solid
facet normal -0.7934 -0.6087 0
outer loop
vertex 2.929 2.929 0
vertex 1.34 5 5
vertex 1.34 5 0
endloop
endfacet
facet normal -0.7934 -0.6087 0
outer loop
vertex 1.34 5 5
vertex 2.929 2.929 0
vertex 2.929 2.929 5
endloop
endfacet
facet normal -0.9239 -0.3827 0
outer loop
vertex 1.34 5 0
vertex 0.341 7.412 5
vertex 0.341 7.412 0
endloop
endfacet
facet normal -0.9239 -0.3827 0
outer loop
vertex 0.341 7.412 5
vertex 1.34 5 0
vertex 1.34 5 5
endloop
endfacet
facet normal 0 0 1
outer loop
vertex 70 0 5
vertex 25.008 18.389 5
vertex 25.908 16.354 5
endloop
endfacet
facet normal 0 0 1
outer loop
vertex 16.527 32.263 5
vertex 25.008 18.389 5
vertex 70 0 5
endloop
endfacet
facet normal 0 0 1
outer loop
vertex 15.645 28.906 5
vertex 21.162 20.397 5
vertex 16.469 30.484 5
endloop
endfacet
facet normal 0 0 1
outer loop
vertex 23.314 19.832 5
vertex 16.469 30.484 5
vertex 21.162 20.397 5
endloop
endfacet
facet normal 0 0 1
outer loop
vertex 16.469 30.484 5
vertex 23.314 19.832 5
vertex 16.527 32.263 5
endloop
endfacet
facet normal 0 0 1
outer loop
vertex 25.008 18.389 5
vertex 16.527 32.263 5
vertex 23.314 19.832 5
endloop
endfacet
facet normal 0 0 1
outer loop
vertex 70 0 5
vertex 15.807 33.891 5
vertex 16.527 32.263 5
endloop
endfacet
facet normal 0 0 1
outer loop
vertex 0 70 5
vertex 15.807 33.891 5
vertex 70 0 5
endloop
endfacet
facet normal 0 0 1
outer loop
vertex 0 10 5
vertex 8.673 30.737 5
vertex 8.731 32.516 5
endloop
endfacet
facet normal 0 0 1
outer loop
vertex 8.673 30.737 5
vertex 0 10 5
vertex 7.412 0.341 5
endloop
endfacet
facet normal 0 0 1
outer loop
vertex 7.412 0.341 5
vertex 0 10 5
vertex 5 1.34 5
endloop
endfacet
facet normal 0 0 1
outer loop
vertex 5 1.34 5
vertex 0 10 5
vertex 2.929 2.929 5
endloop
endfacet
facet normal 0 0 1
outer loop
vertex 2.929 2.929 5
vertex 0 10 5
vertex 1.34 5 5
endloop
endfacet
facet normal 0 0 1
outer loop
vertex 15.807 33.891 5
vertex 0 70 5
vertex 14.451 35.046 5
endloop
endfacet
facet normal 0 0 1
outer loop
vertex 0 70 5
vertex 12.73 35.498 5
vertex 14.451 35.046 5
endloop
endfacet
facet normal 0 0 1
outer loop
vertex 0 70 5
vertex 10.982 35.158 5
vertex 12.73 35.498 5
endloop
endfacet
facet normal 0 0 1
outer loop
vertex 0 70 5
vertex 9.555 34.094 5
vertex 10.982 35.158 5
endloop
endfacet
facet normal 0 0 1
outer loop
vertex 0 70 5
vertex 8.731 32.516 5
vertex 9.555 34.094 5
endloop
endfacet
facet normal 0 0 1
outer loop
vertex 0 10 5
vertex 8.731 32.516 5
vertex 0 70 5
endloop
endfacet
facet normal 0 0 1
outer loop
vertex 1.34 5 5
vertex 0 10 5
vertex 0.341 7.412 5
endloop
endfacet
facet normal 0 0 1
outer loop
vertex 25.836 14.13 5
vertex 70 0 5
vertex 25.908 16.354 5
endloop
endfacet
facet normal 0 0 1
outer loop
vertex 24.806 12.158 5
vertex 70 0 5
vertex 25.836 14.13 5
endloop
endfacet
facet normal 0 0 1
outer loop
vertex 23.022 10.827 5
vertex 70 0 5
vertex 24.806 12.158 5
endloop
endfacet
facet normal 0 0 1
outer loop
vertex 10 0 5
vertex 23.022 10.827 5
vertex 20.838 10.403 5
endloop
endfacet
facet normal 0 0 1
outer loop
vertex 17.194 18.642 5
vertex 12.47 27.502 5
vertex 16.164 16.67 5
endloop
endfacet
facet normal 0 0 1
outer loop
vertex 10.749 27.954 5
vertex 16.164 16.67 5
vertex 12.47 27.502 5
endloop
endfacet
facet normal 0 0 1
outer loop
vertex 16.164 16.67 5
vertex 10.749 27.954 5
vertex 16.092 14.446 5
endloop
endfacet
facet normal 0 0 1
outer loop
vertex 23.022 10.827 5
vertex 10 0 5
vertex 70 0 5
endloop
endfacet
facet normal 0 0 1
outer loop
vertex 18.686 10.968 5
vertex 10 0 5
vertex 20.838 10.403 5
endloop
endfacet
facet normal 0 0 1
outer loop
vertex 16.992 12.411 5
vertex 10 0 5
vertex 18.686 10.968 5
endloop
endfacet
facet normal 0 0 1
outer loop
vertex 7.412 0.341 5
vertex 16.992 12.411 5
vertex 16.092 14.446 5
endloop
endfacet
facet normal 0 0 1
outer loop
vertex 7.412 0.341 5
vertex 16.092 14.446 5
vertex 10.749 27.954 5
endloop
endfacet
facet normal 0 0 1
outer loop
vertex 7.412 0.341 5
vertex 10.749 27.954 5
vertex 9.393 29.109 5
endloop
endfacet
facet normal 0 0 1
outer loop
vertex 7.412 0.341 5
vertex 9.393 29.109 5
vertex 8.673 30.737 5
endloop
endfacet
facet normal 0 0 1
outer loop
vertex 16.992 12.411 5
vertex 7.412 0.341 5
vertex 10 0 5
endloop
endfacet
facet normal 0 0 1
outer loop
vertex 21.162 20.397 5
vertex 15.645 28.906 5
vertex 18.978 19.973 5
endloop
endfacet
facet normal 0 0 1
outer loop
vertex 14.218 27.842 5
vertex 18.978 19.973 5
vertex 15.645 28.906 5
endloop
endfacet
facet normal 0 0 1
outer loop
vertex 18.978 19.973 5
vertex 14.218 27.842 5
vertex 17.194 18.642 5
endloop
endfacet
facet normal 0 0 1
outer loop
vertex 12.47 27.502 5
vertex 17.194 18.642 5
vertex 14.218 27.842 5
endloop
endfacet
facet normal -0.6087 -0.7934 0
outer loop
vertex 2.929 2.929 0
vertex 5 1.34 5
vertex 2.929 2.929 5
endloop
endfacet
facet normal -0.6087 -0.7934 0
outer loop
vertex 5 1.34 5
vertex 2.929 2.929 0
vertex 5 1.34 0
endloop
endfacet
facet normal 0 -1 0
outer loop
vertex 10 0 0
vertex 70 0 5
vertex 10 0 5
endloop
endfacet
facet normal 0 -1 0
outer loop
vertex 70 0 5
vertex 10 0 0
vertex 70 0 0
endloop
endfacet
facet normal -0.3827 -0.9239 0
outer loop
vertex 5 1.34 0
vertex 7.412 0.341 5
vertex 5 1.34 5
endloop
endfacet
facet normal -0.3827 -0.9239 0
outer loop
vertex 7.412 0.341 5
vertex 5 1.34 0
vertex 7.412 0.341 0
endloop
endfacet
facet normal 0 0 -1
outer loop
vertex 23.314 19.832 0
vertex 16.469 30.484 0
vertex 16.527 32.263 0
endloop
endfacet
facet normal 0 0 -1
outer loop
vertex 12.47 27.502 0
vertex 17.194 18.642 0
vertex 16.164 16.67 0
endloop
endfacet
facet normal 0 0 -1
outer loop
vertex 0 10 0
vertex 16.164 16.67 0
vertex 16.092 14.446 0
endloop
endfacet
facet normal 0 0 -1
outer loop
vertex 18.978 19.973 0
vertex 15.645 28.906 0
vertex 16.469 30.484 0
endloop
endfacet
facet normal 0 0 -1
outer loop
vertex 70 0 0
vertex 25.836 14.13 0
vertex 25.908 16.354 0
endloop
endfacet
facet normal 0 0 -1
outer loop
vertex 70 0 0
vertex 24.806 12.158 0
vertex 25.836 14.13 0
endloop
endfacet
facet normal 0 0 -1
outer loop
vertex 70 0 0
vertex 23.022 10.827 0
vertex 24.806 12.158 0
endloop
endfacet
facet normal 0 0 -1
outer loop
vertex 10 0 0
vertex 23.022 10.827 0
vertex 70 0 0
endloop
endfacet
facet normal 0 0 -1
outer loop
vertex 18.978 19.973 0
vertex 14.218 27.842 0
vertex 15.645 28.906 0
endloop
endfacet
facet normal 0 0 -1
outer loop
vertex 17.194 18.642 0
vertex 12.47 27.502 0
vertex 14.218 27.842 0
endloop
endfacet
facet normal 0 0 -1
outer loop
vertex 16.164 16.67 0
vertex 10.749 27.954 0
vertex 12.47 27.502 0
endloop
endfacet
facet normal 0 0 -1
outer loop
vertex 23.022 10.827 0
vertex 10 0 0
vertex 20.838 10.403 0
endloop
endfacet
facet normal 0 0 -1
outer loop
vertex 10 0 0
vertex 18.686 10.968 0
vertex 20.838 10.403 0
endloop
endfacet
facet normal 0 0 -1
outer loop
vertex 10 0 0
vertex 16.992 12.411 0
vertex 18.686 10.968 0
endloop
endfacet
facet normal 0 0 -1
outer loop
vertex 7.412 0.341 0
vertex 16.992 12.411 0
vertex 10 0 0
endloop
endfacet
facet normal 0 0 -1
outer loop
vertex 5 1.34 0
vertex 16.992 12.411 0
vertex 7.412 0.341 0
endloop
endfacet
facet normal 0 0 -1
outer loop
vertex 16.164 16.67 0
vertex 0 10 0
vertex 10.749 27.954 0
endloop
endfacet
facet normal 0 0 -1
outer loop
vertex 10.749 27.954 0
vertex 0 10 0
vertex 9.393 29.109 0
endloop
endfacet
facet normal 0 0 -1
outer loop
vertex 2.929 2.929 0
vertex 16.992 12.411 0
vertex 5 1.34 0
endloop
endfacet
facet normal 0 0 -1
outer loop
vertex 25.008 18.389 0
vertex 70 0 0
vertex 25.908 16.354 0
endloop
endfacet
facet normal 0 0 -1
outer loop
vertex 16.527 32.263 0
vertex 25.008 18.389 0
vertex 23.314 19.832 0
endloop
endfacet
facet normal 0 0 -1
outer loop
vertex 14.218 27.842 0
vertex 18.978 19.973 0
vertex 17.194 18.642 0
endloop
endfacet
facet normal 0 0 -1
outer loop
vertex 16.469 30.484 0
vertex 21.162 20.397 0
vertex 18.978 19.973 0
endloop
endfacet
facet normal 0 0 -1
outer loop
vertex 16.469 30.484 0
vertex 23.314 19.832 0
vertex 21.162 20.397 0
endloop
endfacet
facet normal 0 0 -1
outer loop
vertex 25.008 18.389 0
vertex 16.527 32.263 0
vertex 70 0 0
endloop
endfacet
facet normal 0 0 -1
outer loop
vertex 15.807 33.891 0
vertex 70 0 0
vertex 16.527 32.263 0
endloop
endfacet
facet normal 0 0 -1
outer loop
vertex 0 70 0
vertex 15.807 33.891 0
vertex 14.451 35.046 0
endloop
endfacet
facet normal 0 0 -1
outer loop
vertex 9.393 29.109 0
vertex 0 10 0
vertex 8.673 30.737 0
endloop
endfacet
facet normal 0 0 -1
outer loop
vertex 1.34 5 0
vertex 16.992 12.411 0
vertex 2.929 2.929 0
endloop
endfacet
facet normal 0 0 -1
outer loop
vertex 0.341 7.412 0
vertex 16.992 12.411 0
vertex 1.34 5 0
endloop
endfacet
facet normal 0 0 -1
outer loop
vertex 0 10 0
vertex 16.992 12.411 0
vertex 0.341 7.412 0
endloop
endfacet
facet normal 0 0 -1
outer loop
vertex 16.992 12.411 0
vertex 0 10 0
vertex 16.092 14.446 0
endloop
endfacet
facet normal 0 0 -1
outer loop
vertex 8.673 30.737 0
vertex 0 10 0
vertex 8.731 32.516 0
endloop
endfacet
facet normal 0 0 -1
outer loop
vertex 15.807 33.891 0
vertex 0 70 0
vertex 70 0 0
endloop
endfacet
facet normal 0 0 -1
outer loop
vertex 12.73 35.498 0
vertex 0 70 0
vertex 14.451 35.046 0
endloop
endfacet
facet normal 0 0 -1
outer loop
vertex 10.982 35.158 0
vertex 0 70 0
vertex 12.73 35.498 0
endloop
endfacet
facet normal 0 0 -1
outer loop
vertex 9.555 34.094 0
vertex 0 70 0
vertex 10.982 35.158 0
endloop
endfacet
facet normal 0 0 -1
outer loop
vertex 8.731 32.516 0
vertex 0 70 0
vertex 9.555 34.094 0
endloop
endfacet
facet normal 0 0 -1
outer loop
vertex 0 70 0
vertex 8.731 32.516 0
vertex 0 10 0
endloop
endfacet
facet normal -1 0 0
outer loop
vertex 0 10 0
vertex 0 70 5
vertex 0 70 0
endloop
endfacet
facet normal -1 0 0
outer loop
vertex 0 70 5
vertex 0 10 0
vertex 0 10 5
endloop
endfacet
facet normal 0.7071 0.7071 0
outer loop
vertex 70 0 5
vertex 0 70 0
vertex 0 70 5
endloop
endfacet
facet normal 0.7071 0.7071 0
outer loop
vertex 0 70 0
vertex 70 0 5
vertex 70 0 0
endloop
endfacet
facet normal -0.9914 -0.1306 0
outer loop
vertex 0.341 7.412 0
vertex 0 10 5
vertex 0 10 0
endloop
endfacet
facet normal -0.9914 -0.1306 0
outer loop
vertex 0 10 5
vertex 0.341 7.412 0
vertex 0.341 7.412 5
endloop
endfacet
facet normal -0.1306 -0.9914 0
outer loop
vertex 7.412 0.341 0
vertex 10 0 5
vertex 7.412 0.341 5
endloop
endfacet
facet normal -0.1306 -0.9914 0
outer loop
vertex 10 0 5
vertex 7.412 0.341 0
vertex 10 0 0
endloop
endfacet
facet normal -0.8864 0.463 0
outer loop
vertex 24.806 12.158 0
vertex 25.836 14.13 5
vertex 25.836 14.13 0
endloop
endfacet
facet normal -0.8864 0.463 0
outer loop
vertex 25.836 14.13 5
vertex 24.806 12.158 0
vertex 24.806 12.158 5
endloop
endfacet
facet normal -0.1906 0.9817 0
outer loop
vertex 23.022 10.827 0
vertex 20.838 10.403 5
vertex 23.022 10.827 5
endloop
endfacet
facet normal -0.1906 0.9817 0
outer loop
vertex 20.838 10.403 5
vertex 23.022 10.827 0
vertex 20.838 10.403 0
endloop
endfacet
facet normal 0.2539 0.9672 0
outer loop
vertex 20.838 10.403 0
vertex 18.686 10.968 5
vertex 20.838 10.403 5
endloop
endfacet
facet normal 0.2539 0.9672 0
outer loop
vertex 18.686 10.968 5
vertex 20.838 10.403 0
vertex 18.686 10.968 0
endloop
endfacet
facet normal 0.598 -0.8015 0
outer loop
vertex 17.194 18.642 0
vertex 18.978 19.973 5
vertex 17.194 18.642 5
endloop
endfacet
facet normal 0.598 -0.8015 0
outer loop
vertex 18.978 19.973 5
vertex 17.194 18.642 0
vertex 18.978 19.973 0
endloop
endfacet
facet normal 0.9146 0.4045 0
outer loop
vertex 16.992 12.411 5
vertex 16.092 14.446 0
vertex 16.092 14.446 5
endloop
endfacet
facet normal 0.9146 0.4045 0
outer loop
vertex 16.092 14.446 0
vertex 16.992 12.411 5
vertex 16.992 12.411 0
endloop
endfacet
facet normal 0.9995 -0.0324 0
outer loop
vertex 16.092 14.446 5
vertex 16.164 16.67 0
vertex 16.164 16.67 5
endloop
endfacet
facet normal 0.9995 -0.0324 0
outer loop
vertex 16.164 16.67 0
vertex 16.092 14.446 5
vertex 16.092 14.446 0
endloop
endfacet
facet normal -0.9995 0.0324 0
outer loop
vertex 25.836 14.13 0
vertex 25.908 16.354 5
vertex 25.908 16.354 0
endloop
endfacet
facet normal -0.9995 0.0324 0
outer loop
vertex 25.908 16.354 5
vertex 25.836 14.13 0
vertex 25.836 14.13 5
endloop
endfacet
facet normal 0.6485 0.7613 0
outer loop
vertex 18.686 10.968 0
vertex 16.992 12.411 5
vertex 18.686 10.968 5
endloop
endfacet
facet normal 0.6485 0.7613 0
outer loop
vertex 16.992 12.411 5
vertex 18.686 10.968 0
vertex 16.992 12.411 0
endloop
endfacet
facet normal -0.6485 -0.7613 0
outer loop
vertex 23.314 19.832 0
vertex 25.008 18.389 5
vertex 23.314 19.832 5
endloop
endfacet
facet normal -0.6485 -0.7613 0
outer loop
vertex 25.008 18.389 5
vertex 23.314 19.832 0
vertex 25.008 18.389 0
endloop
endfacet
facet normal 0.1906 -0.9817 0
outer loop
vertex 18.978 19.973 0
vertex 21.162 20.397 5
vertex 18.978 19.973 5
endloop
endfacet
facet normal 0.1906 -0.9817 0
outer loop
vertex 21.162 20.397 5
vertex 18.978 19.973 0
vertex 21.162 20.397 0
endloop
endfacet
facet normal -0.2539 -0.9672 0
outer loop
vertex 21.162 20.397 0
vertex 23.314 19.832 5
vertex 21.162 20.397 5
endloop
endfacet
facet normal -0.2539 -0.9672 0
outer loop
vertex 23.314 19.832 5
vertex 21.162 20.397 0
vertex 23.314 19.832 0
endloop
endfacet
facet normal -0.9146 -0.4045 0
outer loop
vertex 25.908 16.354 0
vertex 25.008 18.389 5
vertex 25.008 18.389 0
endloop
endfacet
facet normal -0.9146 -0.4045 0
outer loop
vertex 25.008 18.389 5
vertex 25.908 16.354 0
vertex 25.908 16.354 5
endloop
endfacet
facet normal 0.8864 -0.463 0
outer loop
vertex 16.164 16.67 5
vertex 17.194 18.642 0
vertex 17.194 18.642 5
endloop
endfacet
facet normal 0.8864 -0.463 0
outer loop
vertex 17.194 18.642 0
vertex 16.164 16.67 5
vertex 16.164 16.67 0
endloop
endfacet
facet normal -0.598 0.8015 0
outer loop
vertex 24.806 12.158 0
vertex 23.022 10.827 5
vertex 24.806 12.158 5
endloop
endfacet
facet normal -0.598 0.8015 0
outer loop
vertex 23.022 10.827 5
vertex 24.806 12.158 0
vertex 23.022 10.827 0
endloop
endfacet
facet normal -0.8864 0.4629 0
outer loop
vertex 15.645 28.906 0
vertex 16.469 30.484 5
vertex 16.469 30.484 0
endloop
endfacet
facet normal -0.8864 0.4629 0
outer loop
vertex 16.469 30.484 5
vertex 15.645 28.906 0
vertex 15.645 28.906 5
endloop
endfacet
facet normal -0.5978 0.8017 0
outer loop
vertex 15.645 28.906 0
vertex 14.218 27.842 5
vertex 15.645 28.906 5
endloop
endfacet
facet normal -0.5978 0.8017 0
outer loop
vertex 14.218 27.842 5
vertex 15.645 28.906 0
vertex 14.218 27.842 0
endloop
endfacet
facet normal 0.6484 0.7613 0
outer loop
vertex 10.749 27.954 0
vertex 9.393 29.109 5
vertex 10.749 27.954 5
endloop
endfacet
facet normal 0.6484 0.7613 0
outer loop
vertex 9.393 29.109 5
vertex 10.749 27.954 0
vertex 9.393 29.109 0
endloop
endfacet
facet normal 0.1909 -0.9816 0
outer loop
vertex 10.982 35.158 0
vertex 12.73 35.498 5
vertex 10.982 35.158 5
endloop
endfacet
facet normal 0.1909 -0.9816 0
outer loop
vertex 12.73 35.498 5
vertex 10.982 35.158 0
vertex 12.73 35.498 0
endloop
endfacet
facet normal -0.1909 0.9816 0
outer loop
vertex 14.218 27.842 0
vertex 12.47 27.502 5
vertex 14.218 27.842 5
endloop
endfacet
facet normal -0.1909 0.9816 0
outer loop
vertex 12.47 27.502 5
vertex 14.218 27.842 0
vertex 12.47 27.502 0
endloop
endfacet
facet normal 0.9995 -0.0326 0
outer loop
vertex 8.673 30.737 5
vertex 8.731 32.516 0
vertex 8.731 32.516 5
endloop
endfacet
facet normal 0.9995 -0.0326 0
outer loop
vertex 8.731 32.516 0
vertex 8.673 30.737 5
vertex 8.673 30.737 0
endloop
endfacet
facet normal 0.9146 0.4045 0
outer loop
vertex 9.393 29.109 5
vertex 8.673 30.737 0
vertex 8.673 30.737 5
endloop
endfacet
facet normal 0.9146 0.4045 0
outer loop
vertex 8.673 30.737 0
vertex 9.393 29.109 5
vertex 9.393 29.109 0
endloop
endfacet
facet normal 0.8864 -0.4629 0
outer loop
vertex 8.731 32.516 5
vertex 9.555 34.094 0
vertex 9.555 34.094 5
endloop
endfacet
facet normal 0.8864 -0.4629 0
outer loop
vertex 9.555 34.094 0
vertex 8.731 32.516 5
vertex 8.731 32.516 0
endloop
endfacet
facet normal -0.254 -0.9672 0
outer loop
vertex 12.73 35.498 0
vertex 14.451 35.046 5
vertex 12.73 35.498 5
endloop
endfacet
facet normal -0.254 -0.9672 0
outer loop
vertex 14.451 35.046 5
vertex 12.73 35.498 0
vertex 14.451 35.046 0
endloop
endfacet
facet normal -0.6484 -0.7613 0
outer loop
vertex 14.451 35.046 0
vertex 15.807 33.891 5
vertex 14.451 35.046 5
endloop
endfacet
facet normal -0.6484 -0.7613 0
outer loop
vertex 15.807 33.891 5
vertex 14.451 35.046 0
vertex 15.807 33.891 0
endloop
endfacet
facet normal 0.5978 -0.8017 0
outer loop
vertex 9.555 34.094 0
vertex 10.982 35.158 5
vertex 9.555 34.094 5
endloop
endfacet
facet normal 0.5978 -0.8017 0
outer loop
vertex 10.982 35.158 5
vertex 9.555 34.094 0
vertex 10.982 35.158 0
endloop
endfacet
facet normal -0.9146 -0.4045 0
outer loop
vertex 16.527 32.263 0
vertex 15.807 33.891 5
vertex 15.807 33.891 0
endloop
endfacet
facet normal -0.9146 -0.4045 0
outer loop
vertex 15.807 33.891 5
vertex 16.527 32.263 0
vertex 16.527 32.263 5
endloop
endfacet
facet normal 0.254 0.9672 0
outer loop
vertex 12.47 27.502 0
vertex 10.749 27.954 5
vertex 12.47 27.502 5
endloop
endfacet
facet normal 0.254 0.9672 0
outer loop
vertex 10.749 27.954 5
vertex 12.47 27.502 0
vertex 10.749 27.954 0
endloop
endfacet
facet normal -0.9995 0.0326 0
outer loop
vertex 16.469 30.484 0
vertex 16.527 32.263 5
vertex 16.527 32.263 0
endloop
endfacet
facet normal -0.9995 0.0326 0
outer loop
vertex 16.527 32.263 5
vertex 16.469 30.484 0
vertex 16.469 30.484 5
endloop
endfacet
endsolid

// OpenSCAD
$fn = 32;

// ----------------------------------------------------------------------
// Bracket plate: corner pad 70 x 70, fillet R10
// ----------------------------------------------------------------------

// --- parameters (mm) ---
hole_r = 4;               // bolt hole radius
plate_t = 5;              // plate thickness, Z (extrusion height)
leg_a = 70;               // base leg
leg_b = 70;               // height leg
fillet_r = 10;            // right-angle fillet radius

hole_d1 = 2 * hole_r + 2;
hole_d2 = 2 * hole_r;

profile = [[10, 0], [70, 0], [0, 70], [0, 10], [0.341, 7.412], [1.34, 5], [2.929, 2.929], [5, 1.34], [7.412, 0.341]];  // primary outline, 9 points, counter clockwise
void_1 = [[25.908, 16.354], [25.008, 18.389], [23.314, 19.832], [21.162, 20.397], [18.978, 19.973], [17.194, 18.642], [16.164, 16.67], [16.092, 14.446], [16.992, 12.411], [18.686, 10.968], [20.838, 10.403], [23.022, 10.827], [24.806, 12.158], [25.836, 14.13]];  // mount hole 1, 14 points
void_2 = [[16.527, 32.263], [15.807, 33.891], [14.451, 35.046], [12.73, 35.498], [10.982, 35.158], [9.555, 34.094], [8.731, 32.516], [8.673, 30.737], [9.393, 29.109], [10.749, 27.954], [12.47, 27.502], [14.218, 27.842], [15.645, 28.906], [16.469, 30.484]];  // mount hole 2, 14 points

// --- the one profile operation ---
difference() {
  linear_extrude(height = plate_t) polygon(points = profile);
  translate([0, 0, -1])
    linear_extrude(height = plate_t + 2) polygon(points = void_1);
  translate([0, 0, -1])
    linear_extrude(height = plate_t + 2) polygon(points = void_2);
}
